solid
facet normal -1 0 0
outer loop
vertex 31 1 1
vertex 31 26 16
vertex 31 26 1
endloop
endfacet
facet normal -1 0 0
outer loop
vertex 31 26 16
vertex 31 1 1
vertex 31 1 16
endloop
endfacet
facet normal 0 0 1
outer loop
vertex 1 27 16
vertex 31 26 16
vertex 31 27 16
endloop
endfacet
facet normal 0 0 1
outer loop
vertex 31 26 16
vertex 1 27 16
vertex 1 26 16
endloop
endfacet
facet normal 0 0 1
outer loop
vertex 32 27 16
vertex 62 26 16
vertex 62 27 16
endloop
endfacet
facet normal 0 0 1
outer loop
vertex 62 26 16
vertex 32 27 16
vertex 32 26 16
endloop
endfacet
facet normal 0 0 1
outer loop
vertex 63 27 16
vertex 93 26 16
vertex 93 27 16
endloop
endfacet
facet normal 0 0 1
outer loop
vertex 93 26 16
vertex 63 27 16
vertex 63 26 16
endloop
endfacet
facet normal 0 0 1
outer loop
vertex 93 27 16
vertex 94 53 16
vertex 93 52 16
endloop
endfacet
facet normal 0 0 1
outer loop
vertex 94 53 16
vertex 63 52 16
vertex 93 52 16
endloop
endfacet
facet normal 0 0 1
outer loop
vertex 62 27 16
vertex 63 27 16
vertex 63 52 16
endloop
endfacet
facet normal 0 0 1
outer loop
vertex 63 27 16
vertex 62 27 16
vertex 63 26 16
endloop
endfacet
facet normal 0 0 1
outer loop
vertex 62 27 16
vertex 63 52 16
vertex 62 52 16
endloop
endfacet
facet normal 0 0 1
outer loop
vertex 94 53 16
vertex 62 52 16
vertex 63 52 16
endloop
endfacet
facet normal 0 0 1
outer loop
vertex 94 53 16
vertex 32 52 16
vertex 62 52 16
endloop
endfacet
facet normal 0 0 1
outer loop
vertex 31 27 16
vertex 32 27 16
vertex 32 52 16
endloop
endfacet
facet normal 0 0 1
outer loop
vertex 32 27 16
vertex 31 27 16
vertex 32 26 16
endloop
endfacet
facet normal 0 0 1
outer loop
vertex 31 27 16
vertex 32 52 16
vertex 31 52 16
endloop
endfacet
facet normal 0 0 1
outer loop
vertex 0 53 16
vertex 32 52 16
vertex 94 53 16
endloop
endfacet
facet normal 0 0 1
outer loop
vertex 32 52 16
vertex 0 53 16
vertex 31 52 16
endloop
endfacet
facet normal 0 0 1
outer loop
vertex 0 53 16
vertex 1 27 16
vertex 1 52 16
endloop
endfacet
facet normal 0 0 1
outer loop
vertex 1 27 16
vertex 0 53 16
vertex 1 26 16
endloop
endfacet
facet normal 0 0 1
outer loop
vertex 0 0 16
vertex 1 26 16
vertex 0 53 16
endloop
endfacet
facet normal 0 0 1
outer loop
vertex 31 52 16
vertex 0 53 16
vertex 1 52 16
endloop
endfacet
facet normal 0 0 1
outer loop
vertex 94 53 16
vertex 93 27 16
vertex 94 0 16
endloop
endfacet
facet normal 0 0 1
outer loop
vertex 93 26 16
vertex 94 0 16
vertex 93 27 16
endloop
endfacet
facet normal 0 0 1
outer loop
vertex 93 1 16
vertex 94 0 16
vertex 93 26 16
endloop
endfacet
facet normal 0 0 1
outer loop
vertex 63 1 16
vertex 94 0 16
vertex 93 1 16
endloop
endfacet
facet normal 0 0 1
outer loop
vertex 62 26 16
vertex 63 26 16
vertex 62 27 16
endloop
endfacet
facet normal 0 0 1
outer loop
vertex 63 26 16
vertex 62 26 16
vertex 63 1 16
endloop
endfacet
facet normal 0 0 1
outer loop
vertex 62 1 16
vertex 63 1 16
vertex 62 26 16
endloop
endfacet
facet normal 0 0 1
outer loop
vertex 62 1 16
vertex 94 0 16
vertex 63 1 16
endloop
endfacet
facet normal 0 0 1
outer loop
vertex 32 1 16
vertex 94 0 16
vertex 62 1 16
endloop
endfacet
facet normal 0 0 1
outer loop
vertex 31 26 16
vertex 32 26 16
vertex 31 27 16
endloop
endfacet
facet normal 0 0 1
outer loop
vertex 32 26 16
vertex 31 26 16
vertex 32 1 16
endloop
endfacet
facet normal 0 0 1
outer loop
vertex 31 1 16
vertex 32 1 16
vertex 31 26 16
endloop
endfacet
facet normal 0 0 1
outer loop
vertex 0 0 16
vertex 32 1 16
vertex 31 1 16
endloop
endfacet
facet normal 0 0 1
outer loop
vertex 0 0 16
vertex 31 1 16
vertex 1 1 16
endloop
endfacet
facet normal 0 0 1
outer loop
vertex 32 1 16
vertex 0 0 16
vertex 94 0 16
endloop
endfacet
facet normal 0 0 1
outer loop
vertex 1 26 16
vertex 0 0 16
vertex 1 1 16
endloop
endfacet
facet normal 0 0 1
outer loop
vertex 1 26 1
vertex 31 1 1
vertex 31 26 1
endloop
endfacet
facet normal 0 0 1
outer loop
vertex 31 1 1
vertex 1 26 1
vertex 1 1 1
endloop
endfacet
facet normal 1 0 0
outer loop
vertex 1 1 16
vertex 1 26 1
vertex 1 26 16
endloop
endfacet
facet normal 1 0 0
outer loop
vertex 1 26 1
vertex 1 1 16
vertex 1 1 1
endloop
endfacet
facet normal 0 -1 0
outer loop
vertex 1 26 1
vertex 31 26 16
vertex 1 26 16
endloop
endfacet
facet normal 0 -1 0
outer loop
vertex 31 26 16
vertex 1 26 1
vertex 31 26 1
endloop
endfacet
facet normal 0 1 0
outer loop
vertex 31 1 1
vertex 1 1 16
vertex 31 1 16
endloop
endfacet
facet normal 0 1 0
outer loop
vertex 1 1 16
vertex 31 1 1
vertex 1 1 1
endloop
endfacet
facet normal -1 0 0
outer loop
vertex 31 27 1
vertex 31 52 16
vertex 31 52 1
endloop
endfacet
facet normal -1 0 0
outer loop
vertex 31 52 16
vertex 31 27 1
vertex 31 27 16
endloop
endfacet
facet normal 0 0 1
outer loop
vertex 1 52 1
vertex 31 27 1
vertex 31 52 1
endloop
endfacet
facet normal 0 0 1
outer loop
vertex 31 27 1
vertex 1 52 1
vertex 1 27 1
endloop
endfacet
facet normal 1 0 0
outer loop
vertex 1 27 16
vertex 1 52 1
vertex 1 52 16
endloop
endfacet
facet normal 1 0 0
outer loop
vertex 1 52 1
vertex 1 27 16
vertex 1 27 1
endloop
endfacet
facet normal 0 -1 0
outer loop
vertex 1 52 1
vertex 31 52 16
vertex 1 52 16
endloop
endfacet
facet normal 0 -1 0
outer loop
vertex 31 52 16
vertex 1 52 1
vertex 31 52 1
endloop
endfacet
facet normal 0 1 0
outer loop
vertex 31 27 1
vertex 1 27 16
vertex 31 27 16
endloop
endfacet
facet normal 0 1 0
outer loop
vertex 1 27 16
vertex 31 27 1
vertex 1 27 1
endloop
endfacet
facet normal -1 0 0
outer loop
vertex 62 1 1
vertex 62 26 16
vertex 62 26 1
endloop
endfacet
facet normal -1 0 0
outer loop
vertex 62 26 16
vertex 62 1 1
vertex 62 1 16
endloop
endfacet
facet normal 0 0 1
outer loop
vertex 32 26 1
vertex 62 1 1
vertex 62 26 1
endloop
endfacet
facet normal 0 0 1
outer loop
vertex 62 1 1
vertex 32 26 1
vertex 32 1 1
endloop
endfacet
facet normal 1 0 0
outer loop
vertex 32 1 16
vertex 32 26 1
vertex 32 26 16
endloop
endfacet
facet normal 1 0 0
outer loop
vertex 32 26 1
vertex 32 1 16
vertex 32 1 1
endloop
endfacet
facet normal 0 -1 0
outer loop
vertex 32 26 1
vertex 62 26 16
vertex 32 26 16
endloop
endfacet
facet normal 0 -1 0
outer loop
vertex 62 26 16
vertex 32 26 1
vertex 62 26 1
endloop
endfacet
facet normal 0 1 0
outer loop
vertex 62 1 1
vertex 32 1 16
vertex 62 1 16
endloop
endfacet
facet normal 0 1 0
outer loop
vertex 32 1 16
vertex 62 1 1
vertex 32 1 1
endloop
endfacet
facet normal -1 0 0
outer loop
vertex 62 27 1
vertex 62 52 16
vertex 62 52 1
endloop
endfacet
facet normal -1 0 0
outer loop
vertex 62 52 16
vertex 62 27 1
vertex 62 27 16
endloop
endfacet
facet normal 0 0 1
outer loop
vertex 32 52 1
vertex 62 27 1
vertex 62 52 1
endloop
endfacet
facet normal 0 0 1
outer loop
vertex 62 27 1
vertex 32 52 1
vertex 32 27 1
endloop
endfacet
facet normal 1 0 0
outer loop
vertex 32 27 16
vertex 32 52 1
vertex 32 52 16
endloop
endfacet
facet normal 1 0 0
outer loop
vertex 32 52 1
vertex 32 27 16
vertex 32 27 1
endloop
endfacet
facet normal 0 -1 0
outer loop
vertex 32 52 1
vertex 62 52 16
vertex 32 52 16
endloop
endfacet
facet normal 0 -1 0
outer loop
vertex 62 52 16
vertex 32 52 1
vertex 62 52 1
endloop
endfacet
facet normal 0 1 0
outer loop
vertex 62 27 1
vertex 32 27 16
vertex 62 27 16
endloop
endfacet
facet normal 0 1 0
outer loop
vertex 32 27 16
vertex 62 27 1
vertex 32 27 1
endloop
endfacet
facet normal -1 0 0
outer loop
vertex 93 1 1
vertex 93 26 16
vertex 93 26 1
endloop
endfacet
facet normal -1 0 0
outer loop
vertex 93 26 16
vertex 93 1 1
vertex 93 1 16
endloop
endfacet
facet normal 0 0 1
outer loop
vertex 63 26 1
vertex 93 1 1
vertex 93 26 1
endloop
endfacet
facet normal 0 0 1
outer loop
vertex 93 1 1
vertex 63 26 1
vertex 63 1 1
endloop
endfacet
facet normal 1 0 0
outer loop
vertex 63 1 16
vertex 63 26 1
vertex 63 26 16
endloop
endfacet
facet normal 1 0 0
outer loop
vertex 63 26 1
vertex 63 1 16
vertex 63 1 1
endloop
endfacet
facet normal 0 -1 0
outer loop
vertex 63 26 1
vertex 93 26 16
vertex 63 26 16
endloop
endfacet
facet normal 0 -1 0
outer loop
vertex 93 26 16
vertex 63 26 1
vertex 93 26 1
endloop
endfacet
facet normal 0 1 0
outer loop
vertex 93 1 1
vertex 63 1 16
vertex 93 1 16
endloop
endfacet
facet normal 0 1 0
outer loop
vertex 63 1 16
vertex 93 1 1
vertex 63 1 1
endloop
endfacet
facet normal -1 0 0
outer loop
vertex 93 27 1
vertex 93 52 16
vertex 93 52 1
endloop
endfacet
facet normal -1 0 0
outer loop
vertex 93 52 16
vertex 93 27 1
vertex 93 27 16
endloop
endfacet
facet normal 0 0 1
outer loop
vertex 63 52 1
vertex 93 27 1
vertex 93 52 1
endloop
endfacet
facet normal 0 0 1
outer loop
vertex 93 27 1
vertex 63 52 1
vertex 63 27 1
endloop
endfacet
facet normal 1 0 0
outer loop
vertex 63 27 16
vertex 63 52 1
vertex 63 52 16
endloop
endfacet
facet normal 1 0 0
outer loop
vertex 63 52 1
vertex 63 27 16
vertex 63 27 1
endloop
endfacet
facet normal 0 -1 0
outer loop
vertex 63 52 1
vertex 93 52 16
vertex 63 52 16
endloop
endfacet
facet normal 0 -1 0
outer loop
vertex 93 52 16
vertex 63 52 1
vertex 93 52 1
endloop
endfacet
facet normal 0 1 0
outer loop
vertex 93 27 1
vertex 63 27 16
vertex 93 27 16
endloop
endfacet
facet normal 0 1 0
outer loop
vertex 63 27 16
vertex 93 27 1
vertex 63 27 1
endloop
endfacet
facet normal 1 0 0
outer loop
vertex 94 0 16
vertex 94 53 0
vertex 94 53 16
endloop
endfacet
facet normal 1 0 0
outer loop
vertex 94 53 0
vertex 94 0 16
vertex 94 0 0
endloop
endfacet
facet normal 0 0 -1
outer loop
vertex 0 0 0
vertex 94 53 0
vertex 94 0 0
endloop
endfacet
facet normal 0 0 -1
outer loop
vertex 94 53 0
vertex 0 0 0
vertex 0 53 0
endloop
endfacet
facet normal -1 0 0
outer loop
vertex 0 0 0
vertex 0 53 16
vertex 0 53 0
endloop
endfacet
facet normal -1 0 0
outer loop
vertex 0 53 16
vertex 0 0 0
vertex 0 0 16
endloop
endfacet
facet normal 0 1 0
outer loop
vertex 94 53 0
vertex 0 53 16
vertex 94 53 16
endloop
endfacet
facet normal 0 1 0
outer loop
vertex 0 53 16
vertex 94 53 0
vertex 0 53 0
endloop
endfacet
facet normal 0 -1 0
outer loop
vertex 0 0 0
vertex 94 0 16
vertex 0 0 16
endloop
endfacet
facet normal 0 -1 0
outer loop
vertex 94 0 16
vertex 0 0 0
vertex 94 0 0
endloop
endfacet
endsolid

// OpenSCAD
$fs=0.25;$fa=6;
difference(){translate([47,26.5,8])cube([94,53,16],center=true);
union() {
translate([1,1,1])translate([15,12.5,7.5])cube([30,25,15],center=true);
translate([1,27,1])translate([15,12.5,7.5])cube([30,25,15],center=true);
translate([32,1,1])translate([15,12.5,7.5])cube([30,25,15],center=true);
translate([32,27,1])translate([15,12.5,7.5])cube([30,25,15],center=true);
translate([63,1,1])translate([15,12.5,7.5])cube([30,25,15],center=true);
translate([63,27,1])translate([15,12.5,7.5])cube([30,25,15],center=true);
}
}
